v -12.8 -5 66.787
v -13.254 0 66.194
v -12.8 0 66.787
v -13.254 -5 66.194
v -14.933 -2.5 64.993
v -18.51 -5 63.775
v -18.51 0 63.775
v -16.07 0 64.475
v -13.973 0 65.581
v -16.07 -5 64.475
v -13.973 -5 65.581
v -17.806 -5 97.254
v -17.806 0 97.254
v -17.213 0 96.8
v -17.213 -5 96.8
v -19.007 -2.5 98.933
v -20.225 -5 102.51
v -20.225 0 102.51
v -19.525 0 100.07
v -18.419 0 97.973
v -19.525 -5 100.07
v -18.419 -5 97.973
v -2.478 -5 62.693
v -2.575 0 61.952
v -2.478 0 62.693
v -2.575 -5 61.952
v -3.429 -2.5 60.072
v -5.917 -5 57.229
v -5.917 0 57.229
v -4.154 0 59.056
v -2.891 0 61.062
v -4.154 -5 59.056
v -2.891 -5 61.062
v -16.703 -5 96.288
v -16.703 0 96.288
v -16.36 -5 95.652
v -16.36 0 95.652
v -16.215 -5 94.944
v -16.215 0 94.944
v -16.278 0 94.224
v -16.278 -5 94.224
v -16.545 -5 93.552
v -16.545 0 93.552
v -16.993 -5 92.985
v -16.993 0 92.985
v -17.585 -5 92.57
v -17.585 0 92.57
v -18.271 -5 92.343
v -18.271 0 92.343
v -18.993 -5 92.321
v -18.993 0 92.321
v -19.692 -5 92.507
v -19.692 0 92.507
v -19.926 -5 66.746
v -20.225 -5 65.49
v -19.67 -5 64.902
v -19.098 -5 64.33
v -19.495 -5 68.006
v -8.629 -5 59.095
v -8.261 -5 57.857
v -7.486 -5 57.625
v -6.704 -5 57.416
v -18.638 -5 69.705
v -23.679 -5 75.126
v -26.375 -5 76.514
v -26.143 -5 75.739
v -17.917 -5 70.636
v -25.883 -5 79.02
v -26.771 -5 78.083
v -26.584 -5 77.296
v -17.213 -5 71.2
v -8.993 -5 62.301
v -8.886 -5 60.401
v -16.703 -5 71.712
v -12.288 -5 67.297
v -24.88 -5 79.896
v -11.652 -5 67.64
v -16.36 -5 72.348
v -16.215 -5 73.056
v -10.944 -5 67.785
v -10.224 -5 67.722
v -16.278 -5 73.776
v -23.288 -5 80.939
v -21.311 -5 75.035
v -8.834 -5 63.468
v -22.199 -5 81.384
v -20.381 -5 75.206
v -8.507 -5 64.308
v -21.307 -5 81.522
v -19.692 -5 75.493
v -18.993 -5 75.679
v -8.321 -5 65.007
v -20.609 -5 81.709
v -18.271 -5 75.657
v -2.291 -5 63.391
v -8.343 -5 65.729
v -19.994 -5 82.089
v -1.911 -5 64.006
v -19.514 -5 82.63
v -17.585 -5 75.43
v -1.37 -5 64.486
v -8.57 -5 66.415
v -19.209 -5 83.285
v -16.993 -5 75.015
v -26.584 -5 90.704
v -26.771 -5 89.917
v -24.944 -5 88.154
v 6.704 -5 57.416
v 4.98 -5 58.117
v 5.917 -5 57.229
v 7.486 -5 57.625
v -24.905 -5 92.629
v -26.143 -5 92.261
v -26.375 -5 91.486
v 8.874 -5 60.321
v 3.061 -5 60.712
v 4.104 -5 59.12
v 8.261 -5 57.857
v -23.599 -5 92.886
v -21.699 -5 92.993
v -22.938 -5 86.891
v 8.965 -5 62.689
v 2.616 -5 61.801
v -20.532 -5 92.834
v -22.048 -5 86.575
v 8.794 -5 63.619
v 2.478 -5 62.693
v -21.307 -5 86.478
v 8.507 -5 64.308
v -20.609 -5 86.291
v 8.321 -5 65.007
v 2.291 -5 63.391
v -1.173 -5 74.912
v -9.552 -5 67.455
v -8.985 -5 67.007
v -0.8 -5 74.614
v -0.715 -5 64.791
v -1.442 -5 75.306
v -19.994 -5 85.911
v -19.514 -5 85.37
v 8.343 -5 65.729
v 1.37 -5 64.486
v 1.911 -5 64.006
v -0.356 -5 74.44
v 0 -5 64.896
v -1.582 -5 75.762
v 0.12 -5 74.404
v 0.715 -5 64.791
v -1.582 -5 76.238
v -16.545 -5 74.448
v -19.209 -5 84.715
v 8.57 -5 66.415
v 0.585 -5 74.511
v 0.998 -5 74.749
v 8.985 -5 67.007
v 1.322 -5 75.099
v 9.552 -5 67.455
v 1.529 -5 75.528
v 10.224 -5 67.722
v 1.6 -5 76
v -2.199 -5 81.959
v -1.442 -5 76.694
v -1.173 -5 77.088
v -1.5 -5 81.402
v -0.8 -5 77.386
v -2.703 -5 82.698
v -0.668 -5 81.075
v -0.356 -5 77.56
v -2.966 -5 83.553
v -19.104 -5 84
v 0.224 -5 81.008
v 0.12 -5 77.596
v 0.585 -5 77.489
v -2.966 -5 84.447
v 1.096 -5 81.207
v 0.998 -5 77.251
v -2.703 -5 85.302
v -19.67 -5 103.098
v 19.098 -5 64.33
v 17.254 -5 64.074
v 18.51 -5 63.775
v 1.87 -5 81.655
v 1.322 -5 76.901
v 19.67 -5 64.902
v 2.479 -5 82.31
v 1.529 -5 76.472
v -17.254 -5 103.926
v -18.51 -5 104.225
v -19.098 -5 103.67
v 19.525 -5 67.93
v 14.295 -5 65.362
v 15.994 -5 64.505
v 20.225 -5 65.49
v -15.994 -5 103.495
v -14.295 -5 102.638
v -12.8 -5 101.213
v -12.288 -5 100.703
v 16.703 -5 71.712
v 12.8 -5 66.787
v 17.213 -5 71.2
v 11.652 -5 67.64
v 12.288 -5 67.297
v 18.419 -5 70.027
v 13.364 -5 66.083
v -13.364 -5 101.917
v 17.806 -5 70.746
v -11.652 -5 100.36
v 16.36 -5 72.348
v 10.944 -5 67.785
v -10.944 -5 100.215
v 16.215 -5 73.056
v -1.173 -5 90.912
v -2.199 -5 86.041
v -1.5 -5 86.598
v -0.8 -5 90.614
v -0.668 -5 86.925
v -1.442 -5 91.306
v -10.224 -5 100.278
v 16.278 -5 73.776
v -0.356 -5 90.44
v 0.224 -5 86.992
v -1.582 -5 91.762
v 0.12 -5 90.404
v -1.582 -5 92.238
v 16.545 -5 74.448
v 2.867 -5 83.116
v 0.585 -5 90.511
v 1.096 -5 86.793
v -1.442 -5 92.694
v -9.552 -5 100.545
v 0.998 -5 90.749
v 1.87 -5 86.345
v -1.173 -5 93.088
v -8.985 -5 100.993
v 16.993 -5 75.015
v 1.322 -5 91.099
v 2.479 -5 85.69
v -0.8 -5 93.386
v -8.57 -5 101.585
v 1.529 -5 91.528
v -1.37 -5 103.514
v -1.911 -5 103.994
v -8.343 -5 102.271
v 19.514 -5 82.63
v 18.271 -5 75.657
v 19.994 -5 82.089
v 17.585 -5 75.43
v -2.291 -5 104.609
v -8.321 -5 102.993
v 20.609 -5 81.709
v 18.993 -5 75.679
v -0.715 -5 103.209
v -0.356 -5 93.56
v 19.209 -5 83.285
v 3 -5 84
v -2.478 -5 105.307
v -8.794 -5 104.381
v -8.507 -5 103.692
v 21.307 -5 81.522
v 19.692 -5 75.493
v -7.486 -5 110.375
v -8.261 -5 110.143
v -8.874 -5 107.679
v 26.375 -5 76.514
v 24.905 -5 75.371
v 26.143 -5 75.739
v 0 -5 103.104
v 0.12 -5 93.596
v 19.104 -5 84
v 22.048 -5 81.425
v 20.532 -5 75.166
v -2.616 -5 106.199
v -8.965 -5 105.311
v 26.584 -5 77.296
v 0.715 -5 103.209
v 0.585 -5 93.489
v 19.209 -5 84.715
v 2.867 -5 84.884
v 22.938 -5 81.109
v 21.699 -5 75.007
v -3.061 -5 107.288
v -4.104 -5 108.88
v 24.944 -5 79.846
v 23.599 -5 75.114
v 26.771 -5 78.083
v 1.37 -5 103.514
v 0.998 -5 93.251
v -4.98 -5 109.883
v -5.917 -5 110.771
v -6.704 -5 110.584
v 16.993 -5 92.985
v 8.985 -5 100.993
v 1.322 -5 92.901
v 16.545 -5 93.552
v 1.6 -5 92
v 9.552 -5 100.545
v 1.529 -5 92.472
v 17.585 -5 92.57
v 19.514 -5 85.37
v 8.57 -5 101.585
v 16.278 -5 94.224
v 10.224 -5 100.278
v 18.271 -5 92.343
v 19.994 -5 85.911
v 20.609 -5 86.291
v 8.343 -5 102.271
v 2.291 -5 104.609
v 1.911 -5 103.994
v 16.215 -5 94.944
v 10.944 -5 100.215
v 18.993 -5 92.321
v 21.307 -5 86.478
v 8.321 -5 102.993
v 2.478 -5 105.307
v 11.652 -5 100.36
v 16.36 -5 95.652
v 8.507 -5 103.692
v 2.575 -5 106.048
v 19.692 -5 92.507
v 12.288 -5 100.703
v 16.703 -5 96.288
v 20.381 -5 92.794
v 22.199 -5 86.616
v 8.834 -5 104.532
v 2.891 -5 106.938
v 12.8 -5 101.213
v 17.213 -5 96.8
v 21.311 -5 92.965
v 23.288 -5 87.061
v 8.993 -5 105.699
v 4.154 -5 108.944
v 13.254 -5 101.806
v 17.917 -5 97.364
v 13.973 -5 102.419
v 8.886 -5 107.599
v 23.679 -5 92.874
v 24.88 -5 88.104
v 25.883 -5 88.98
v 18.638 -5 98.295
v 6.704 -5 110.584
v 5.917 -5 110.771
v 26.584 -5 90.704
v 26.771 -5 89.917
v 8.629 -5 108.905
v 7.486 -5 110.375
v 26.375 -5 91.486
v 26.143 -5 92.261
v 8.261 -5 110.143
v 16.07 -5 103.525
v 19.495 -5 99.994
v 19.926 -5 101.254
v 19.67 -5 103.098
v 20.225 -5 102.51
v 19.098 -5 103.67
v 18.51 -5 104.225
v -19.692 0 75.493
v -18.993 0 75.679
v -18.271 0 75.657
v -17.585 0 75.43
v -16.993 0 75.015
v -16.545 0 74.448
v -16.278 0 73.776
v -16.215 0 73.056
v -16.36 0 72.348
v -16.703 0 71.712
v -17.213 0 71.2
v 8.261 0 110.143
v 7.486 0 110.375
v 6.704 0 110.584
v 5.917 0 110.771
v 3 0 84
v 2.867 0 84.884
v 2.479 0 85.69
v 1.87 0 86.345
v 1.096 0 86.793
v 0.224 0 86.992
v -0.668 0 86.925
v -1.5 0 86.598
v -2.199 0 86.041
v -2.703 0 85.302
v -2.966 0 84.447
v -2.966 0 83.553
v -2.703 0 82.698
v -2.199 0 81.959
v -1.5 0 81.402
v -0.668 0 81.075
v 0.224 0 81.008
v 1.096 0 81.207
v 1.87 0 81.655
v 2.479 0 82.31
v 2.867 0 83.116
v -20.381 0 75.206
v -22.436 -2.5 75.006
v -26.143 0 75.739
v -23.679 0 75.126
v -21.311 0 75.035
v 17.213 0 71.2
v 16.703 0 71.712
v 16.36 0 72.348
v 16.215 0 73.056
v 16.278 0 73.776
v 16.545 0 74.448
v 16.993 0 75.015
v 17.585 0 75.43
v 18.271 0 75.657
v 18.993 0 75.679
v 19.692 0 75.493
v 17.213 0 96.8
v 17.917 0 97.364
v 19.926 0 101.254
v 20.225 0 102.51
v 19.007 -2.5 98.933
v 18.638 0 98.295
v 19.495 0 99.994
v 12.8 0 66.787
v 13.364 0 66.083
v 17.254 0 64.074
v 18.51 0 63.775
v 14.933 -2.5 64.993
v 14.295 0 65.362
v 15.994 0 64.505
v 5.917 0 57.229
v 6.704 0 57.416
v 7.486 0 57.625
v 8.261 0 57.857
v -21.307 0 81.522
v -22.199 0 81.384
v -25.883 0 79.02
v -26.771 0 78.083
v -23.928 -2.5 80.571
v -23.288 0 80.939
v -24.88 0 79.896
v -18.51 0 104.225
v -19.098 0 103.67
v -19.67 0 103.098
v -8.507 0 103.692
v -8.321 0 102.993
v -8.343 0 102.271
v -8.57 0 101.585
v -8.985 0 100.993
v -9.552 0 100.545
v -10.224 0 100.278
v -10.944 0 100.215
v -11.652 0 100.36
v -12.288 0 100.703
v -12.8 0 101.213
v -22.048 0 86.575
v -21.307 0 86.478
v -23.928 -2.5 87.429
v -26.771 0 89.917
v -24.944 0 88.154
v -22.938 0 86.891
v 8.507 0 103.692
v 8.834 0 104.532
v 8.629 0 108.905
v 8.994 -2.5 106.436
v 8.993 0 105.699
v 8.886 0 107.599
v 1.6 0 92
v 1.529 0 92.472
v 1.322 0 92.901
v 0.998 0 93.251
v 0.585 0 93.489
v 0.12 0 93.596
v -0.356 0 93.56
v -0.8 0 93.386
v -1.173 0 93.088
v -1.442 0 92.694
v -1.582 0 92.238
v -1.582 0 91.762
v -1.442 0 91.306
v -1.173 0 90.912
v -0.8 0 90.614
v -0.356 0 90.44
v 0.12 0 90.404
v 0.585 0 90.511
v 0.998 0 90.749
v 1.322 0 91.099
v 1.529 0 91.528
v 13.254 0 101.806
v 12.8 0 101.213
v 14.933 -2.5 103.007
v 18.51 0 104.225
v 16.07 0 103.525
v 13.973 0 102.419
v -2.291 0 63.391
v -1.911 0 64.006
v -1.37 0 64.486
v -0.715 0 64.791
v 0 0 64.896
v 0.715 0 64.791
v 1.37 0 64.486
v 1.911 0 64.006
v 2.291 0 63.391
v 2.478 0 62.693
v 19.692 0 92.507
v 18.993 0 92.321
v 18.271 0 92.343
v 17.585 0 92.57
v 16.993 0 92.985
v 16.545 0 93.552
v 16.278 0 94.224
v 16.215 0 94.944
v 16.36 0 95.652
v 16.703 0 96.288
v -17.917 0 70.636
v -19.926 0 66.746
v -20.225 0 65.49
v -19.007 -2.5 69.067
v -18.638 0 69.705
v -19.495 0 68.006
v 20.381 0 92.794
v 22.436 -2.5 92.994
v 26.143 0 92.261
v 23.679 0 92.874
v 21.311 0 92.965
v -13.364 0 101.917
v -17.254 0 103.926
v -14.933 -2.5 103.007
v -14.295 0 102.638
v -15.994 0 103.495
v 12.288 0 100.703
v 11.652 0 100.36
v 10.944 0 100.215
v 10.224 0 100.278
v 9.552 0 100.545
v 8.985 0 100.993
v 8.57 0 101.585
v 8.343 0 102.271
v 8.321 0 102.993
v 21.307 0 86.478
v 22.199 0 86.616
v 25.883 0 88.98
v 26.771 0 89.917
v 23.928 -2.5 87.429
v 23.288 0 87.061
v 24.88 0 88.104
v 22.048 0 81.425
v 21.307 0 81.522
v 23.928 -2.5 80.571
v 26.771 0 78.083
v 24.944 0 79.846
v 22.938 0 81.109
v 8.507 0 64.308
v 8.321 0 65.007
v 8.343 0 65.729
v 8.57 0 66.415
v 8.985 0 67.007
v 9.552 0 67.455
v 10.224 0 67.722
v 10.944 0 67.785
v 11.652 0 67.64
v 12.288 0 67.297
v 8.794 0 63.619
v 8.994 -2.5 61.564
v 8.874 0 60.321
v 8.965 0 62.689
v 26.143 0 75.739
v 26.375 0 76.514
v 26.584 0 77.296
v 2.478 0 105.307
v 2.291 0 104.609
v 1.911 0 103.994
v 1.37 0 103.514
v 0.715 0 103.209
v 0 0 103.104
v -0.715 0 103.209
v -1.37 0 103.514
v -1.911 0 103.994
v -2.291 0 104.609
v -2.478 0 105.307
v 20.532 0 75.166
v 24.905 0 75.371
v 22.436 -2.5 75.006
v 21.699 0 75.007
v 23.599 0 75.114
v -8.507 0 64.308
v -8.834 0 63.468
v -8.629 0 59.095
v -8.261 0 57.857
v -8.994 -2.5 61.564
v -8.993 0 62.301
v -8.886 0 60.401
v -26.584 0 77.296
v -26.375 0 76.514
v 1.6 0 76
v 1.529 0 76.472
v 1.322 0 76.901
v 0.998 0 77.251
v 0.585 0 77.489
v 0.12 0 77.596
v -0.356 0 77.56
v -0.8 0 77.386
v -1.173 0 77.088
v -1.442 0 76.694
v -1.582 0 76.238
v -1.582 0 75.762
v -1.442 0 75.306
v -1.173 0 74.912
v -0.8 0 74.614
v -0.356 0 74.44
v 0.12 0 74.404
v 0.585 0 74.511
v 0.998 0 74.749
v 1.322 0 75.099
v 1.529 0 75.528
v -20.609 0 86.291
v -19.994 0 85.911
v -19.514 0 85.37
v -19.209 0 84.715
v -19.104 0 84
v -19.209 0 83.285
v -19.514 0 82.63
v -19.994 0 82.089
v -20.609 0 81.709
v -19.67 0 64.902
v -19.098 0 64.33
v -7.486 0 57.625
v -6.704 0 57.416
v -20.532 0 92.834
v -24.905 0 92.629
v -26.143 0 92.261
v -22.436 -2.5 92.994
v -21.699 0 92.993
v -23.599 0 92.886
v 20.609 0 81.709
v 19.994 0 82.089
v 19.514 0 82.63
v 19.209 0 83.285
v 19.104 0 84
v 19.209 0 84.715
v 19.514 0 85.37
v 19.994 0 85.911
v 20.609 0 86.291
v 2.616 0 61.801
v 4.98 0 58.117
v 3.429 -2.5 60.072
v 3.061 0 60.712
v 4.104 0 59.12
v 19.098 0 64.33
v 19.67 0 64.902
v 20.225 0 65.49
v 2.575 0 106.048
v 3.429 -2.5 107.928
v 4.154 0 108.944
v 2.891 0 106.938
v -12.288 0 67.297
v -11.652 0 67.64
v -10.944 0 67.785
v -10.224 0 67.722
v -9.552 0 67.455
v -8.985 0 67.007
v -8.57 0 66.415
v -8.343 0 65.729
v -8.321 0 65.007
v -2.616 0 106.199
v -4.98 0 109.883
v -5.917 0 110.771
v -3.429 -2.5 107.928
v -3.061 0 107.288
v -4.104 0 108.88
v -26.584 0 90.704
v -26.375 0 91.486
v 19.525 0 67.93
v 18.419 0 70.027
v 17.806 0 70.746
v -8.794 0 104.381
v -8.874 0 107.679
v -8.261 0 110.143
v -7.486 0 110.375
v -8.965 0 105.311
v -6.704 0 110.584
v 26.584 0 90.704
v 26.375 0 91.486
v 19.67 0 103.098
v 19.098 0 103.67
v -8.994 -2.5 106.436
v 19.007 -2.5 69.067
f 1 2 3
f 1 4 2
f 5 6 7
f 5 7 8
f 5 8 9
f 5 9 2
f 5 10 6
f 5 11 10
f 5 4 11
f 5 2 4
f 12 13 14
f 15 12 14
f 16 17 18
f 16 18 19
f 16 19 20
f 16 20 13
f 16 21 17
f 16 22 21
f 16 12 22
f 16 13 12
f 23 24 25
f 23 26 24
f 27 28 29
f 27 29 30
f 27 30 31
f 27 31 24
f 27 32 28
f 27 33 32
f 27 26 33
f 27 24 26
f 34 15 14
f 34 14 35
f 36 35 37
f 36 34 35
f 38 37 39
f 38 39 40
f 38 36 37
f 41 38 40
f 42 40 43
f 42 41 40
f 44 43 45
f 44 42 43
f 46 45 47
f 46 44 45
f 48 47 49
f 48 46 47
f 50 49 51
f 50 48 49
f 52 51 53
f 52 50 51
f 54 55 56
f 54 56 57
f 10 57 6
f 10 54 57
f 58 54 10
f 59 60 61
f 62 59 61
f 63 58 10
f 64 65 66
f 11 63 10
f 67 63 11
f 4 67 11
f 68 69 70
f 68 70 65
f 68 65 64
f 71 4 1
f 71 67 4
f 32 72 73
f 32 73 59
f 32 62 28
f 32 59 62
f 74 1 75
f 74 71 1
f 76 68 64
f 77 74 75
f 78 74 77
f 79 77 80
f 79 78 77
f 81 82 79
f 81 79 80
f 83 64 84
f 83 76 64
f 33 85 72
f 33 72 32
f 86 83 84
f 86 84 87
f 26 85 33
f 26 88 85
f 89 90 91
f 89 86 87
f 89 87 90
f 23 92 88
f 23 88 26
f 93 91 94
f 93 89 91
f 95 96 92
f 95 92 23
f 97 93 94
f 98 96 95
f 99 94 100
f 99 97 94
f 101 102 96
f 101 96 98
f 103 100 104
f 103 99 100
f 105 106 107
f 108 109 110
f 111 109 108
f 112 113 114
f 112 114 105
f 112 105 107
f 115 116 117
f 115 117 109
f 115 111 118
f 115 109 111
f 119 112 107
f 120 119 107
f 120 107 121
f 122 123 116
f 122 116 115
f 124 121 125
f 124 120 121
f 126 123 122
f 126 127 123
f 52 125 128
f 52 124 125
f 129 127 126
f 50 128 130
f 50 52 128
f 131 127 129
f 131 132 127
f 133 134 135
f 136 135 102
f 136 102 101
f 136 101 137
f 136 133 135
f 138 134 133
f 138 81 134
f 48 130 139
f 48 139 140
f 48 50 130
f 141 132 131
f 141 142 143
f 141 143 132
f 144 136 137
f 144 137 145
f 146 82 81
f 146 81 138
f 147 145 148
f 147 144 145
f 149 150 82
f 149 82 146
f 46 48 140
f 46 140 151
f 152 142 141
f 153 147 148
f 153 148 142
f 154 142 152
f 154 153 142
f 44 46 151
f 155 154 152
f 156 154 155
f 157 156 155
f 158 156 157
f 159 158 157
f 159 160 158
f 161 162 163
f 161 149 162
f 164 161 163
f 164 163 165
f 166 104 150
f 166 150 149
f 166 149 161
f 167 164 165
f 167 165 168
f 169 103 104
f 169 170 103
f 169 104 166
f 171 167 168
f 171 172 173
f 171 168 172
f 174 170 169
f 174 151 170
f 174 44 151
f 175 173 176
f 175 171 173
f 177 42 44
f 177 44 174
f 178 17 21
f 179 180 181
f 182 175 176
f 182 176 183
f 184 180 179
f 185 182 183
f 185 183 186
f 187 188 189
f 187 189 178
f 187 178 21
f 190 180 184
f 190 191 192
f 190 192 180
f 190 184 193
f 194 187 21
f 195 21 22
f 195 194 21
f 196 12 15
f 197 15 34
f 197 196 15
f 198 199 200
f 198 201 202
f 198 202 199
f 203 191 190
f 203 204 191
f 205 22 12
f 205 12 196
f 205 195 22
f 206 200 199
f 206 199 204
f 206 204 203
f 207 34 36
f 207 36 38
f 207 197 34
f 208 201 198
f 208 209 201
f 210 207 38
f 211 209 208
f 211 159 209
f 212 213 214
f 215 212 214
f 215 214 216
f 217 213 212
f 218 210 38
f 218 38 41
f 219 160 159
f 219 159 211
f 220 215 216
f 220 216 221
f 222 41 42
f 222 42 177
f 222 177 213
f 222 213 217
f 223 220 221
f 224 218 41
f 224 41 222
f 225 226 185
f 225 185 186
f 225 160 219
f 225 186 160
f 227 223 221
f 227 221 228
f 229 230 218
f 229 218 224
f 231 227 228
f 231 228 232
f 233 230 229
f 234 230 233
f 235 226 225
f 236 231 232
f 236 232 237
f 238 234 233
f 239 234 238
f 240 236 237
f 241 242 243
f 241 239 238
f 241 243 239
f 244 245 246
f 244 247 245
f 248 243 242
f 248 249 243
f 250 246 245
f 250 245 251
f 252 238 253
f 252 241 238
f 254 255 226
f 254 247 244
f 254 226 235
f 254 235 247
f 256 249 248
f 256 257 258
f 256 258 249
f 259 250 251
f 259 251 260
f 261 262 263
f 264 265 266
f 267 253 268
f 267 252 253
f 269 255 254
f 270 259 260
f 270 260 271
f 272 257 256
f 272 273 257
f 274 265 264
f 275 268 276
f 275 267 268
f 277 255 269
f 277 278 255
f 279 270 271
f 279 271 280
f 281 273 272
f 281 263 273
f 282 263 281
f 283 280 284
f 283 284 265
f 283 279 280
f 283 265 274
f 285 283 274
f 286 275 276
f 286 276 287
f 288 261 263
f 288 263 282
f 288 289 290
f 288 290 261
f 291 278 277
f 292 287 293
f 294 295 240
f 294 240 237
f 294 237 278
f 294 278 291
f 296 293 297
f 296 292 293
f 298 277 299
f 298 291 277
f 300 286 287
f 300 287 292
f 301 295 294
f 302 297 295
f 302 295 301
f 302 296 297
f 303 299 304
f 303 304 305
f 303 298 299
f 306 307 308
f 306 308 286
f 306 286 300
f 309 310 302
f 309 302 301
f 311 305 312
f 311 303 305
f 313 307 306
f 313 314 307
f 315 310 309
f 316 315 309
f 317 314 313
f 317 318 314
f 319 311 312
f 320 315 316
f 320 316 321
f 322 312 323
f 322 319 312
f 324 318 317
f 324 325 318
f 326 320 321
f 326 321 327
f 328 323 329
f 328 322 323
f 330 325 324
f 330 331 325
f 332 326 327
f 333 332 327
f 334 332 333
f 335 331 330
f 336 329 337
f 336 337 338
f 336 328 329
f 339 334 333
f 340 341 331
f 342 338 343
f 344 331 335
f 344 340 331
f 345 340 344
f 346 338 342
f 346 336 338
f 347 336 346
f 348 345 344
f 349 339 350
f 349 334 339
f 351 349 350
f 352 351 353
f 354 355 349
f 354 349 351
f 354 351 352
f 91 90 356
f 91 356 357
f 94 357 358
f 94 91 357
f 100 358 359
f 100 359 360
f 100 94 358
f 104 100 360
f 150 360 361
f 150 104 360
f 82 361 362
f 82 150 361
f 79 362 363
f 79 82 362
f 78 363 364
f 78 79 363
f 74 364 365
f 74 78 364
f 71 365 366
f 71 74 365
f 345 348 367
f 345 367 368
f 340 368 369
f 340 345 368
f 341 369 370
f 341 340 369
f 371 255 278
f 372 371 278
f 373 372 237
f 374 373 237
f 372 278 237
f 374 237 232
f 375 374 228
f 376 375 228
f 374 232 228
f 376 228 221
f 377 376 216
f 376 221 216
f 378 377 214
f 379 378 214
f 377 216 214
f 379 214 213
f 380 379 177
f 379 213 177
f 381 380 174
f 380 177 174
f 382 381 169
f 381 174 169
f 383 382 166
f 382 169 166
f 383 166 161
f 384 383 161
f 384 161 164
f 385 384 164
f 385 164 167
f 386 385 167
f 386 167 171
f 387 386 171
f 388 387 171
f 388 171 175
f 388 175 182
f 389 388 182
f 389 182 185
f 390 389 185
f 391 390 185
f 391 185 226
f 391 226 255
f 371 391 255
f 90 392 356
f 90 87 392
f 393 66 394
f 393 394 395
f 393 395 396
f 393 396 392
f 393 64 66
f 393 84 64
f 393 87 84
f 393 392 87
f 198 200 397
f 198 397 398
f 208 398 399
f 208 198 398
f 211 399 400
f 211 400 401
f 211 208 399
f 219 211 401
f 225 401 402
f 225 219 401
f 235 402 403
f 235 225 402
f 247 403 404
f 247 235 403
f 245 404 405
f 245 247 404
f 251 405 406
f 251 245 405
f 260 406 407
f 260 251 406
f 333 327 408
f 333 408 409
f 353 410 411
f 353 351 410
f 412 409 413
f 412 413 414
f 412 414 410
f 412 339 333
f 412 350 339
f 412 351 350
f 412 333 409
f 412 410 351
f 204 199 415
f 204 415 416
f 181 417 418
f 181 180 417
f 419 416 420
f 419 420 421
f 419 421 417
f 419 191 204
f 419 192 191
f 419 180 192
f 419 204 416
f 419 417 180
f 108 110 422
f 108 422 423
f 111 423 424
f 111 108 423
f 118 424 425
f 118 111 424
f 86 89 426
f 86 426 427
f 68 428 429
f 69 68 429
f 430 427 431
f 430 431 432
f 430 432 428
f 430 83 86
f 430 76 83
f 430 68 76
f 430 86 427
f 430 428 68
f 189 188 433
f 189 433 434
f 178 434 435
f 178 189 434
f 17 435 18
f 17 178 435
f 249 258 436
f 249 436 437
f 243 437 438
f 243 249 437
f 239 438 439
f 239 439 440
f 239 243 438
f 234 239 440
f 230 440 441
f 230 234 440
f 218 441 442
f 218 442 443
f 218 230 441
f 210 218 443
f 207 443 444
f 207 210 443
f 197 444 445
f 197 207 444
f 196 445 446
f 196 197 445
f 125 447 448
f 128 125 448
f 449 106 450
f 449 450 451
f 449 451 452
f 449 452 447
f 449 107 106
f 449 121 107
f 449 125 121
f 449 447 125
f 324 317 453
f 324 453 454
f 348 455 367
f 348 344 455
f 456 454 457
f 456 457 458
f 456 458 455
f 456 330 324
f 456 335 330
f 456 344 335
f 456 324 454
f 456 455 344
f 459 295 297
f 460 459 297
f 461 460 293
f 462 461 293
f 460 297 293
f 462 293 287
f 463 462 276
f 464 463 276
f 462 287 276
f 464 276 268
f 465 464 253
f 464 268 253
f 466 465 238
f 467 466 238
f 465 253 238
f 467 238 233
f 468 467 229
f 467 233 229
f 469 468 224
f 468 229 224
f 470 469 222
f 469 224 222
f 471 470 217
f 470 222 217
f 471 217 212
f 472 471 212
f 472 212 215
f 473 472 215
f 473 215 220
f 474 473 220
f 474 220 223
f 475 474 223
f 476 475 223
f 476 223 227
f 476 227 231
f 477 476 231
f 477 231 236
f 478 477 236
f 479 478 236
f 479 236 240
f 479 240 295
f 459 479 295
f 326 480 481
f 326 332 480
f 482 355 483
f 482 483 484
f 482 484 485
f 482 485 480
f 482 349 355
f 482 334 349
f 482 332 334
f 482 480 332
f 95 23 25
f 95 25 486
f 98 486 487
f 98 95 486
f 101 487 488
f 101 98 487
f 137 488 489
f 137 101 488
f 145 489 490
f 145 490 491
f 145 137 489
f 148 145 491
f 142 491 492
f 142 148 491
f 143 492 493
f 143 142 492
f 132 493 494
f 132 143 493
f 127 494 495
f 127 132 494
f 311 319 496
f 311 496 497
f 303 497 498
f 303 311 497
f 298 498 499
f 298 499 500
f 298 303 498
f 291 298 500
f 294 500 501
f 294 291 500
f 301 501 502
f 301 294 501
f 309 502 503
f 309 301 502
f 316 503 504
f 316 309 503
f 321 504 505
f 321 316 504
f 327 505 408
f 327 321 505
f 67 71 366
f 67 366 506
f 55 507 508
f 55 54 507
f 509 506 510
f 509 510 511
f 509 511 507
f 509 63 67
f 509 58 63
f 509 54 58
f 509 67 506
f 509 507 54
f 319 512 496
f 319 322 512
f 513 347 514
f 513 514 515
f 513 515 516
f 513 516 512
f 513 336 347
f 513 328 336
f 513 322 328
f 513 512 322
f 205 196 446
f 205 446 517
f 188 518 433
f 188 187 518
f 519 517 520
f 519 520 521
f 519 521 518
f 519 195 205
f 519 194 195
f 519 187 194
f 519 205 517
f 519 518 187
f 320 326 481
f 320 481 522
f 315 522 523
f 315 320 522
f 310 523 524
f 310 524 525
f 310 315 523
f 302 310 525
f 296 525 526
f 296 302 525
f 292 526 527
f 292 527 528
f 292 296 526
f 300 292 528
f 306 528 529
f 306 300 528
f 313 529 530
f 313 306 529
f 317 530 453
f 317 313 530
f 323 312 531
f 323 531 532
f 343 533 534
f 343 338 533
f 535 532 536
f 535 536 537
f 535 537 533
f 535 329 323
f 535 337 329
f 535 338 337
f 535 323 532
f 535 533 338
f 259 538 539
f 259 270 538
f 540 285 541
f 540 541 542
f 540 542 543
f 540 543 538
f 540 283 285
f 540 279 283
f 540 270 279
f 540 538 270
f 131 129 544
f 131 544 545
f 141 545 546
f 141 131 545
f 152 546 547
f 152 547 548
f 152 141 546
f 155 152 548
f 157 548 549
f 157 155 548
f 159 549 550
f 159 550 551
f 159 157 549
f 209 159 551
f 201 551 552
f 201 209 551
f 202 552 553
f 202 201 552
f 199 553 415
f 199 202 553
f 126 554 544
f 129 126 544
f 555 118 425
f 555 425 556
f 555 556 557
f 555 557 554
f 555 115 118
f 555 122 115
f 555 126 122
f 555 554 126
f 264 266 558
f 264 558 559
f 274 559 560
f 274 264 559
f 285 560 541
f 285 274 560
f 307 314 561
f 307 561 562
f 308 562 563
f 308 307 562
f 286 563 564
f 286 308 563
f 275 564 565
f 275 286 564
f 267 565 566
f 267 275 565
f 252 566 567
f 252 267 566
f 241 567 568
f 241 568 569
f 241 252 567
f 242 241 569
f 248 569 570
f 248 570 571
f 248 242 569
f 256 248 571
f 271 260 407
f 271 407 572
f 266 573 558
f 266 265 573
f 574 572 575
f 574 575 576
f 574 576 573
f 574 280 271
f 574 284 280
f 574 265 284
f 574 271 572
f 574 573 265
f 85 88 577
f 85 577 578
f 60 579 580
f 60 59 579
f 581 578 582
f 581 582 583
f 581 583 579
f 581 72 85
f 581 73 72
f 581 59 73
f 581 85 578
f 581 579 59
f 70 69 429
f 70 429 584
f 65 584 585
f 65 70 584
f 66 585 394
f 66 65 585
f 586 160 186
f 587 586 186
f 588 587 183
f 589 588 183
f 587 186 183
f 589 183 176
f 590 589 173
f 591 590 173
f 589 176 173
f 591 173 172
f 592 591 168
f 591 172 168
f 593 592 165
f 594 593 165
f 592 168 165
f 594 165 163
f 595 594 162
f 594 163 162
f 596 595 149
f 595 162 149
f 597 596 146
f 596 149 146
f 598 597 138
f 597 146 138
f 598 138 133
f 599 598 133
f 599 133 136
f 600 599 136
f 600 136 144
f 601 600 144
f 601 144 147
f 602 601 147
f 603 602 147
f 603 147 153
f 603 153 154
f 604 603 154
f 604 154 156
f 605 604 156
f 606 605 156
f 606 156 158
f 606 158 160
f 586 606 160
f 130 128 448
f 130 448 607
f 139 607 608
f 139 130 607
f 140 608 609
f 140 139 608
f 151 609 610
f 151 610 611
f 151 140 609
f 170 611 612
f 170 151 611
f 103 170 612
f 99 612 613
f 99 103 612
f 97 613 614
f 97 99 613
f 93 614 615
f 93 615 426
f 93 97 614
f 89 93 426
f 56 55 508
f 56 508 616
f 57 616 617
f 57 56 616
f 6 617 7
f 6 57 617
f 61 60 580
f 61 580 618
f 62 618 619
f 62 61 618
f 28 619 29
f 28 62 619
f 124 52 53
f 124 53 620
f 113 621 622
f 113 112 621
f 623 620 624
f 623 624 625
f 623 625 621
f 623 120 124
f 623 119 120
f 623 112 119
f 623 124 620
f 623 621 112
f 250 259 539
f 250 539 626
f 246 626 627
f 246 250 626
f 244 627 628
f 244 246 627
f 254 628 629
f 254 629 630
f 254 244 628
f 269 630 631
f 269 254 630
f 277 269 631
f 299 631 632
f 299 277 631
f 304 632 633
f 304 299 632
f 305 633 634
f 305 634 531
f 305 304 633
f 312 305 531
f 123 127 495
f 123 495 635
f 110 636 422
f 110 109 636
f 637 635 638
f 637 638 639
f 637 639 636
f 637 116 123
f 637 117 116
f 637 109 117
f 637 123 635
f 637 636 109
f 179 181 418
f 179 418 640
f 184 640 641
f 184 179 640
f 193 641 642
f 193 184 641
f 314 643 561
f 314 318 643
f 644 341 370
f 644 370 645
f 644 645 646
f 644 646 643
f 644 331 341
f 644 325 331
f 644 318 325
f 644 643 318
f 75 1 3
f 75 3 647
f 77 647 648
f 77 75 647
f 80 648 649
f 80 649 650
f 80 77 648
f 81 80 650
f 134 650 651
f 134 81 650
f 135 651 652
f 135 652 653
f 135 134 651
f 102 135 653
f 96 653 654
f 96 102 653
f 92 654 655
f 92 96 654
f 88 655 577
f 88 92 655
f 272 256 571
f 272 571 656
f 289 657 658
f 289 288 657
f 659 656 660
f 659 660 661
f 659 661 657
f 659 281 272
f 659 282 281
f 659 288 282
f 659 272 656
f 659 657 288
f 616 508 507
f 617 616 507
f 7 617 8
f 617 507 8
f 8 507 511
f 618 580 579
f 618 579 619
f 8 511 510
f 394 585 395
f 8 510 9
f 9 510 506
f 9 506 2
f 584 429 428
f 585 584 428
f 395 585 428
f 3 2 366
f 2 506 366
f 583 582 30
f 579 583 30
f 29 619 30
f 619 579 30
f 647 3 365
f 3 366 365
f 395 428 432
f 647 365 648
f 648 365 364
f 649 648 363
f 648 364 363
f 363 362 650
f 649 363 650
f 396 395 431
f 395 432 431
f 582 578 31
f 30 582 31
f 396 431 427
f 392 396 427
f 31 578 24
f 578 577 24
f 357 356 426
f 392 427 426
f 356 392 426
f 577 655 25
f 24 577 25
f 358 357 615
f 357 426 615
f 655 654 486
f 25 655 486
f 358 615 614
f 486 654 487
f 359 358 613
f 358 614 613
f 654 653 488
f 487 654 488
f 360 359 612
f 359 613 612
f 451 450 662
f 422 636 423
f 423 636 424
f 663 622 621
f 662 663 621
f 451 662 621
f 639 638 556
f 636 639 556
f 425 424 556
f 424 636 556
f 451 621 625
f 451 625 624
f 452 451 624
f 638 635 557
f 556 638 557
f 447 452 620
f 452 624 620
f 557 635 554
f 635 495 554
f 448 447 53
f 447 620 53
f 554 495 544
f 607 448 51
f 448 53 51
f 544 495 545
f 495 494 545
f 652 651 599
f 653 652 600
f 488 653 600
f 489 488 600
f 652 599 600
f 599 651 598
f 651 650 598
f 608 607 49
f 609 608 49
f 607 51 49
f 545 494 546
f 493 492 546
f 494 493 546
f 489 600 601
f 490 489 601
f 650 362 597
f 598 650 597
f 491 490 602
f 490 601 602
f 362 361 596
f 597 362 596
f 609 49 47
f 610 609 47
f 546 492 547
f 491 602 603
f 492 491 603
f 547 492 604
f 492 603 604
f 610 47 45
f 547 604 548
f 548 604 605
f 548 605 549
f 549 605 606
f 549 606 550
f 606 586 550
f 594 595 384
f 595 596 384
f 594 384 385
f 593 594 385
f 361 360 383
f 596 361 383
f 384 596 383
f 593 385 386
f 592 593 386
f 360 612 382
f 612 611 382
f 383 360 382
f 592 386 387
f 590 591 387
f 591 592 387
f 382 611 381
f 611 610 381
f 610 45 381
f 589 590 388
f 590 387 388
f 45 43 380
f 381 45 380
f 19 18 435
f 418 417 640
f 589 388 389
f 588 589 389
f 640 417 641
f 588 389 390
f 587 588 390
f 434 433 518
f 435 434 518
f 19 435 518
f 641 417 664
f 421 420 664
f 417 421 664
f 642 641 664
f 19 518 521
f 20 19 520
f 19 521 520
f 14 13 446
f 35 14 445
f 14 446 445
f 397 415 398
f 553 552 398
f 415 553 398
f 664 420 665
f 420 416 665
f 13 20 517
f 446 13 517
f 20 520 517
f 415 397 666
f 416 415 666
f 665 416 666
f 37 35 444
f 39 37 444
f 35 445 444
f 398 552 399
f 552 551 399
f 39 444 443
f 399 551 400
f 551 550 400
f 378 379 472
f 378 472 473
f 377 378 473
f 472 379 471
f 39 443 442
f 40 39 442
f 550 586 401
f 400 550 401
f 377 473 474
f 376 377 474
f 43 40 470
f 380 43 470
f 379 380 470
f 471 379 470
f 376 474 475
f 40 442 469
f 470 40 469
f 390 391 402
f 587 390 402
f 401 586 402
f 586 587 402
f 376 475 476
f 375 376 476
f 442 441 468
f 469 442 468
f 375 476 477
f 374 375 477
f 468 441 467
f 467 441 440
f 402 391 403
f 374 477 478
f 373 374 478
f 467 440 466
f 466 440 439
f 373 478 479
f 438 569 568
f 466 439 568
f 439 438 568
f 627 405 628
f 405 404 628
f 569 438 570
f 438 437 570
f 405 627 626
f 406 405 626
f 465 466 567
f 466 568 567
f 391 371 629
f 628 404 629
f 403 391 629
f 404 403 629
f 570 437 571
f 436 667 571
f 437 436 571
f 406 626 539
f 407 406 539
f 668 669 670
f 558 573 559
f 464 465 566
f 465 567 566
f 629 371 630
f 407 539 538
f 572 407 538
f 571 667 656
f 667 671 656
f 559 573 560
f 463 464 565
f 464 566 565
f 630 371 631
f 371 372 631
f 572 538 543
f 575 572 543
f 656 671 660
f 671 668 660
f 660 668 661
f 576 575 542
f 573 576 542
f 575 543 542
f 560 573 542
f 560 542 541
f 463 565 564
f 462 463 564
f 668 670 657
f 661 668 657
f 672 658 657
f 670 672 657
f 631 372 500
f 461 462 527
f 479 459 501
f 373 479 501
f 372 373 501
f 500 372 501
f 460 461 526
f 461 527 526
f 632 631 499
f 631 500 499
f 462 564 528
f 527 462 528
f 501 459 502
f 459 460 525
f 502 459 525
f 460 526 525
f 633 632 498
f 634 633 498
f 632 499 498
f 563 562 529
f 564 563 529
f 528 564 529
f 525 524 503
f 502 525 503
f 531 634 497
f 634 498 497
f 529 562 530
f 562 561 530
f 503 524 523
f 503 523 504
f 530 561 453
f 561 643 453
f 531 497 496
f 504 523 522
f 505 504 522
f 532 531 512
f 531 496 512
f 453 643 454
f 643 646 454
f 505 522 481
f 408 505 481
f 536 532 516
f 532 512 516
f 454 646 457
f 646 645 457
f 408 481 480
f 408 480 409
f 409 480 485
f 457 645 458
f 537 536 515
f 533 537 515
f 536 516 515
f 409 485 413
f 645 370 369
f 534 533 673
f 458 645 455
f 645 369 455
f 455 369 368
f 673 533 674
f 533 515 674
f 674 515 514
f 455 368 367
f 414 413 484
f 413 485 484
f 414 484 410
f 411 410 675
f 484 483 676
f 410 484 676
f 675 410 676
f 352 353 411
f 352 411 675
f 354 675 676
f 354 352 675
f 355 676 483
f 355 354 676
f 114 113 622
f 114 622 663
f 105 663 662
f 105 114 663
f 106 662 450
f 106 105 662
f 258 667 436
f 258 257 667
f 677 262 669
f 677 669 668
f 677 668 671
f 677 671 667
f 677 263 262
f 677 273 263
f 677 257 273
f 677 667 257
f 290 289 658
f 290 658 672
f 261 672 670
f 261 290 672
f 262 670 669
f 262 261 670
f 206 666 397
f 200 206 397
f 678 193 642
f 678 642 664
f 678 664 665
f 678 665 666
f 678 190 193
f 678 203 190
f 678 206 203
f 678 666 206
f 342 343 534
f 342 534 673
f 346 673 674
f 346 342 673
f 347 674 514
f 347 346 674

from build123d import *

# Parameters (mm, degrees)
RESSALTO_EXTRUS_O1_DEPTH = 5
ESBO_O3_R                = 3
ESBO_O3_R_2              = 1.6
CORTE_EXTRUS_O1_DEPTH    = 10


with BuildPart() as part:
    # Esboço1 → Ressalto-extrusão1 (new body)
    with BuildSketch(Plane.XZ.offset(5)):
        with BuildLine():
            ThreePointArc((-19.691703555, 75.492649623), (-16.544693651, 74.447916667), (-17.213433323, 71.200159666))
            add(Edge.make_bspline(
                [(-17.213433323, 71.200159666), (-19.371007478, 69.977475346), (-20.225381706, 65.490339119)],
                knots=[3.520301614, 3.520301614, 3.520301614, 4.832179179, 4.832179179, 4.832179179], degree=2, weights=[1, 0.79247571, 1]))
            ThreePointArc((-20.225381706, 65.490339119), (-19.386510918, 64.613489082), (-18.509660881, 63.774618294))
            add(Edge.make_bspline(
                [(-18.509660881, 63.774618294), (-14.022524654, 64.628992522), (-12.799840334, 66.786566677)],
                knots=[4.592598781, 4.592598781, 4.592598781, 5.904476347, 5.904476347, 5.904476347], degree=2, weights=[1, 0.79247571, 1]))
            ThreePointArc((-12.799840334, 66.786566677), (-9.552083333, 67.455306349), (-8.507350377, 64.308296445))
            add(Edge.make_bspline(
                [(-8.507350377, 64.308296445), (-9.764522246, 62.170633685), (-8.260863918, 57.857472608)],
                knots=[0.37870896, 0.37870896, 0.37870896, 1.690586526, 1.690586526, 1.690586526], degree=2, weights=[1, 0.79247571, 1]))
            ThreePointArc((-8.260863918, 57.857472608), (-7.095955487, 57.517533596), (-5.917145685, 57.2294752))
            add(Edge.make_bspline(
                [(-5.917145685, 57.2294752), (-2.458358837, 60.2129531), (-2.478270232, 62.692809289)],
                knots=[4.592598781, 4.592598781, 4.592598781, 5.904476347, 5.904476347, 5.904476347], degree=2, weights=[1, 0.79247571, 1]))
            ThreePointArc((-2.478270232, 62.692809289), (0, 64.895833333), (2.478270232, 62.692809289))
            add(Edge.make_bspline(
                [(2.478270232, 62.692809289), (2.458358837, 60.2129531), (5.917145685, 57.2294752)],
                knots=[3.520301614, 3.520301614, 3.520301614, 4.832179179, 4.832179179, 4.832179179], degree=2, weights=[1, 0.79247571, 1]))
            ThreePointArc((5.917145685, 57.2294752), (7.095955487, 57.517533596), (8.260863918, 57.857472608))
            add(Edge.make_bspline(
                [(8.260863918, 57.857472608), (9.764522246, 62.170633685), (8.507350377, 64.308296445)],
                knots=[4.592598781, 4.592598781, 4.592598781, 5.904476347, 5.904476347, 5.904476347], degree=2, weights=[1, 0.79247571, 1]))
            ThreePointArc((8.507350377, 64.308296445), (9.552083333, 67.455306349), (12.799840334, 66.786566677))
            add(Edge.make_bspline(
                [(12.799840334, 66.786566677), (14.022524654, 64.628992522), (18.509660881, 63.774618294)],
                knots=[3.520301614, 3.520301614, 3.520301614, 4.832179179, 4.832179179, 4.832179179], degree=2, weights=[1, 0.79247571, 1]))
            ThreePointArc((18.509660881, 63.774618294), (19.386510918, 64.613489082), (20.225381706, 65.490339119))
            add(Edge.make_bspline(
                [(20.225381706, 65.490339119), (19.371007478, 69.977475346), (17.213433323, 71.200159666)],
                knots=[4.592598781, 4.592598781, 4.592598781, 5.904476347, 5.904476347, 5.904476347], degree=2, weights=[1, 0.79247571, 1]))
            ThreePointArc((17.213433323, 71.200159666), (16.544693651, 74.447916667), (19.691703555, 75.492649623))
            add(Edge.make_bspline(
                [(19.691703555, 75.492649623), (21.829366315, 74.235477754), (26.142527392, 75.739136082)],
                knots=[3.520301614, 3.520301614, 3.520301614, 4.832179179, 4.832179179, 4.832179179], degree=2, weights=[1, 0.79247571, 1]))
            ThreePointArc((26.142527392, 75.739136082), (26.482466404, 76.904044513), (26.7705248, 78.082854315))
            add(Edge.make_bspline(
                [(26.7705248, 78.082854315), (23.7870469, 81.541641163), (21.307190711, 81.521729768)],
                knots=[4.592598781, 4.592598781, 4.592598781, 5.904476347, 5.904476347, 5.904476347], degree=2, weights=[1, 0.79247571, 1]))
            ThreePointArc((21.307190711, 81.521729768), (19.104166667, 84), (21.307190711, 86.478270232))
            add(Edge.make_bspline(
                [(21.307190711, 86.478270232), (23.7870469, 86.458358837), (26.7705248, 89.917145685)],
                knots=[0.37870896, 0.37870896, 0.37870896, 1.690586526, 1.690586526, 1.690586526], degree=2, weights=[1, 0.79247571, 1]))
            ThreePointArc((26.7705248, 89.917145685), (26.482466404, 91.095955487), (26.142527392, 92.260863918))
            add(Edge.make_bspline(
                [(26.142527392, 92.260863918), (21.829366315, 93.764522246), (19.691703555, 92.507350377)],
                knots=[1.451006128, 1.451006128, 1.451006128, 2.762883693, 2.762883693, 2.762883693], degree=2, weights=[1, 0.79247571, 1]))
            ThreePointArc((19.691703555, 92.507350377), (16.544693651, 93.552083333), (17.213433323, 96.799840334))
            add(Edge.make_bspline(
                [(17.213433323, 96.799840334), (19.371007478, 98.022524654), (20.225381706, 102.509660881)],
                knots=[0.37870896, 0.37870896, 0.37870896, 1.690586526, 1.690586526, 1.690586526], degree=2, weights=[1, 0.79247571, 1]))
            ThreePointArc((20.225381706, 102.509660881), (19.386510918, 103.386510918), (18.509660881, 104.225381706))
            add(Edge.make_bspline(
                [(18.509660881, 104.225381706), (14.022524654, 103.371007478), (12.799840334, 101.213433323)],
                knots=[4.592598781, 4.592598781, 4.592598781, 5.904476347, 5.904476347, 5.904476347], degree=2, weights=[1, 0.79247571, 1]))
            ThreePointArc((12.799840334, 101.213433323), (9.552083333, 100.544693651), (8.507350377, 103.691703555))
            add(Edge.make_bspline(
                [(8.507350377, 103.691703555), (9.764522246, 105.829366315), (8.260863918, 110.142527392)],
                knots=[0.37870896, 0.37870896, 0.37870896, 1.690586526, 1.690586526, 1.690586526], degree=2, weights=[1, 0.79247571, 1]))
            ThreePointArc((8.260863918, 110.142527392), (7.095955487, 110.482466404), (5.917145685, 110.7705248))
            add(Edge.make_bspline(
                [(5.917145685, 110.7705248), (2.458358837, 107.7870469), (2.478270232, 105.307190711)],
                knots=[1.451006128, 1.451006128, 1.451006128, 2.762883693, 2.762883693, 2.762883693], degree=2, weights=[1, 0.79247571, 1]))
            ThreePointArc((2.478270232, 105.307190711), (0, 103.104166667), (-2.478270232, 105.307190711))
            add(Edge.make_bspline(
                [(-2.478270232, 105.307190711), (-2.458358837, 107.7870469), (-5.917145685, 110.7705248)],
                knots=[0.37870896, 0.37870896, 0.37870896, 1.690586526, 1.690586526, 1.690586526], degree=2, weights=[1, 0.79247571, 1]))
            ThreePointArc((-5.917145685, 110.7705248), (-7.095955487, 110.482466404), (-8.260863918, 110.142527392))
            add(Edge.make_bspline(
                [(-8.260863918, 110.142527392), (-9.764522246, 105.829366315), (-8.507350377, 103.691703555)],
                knots=[1.451006128, 1.451006128, 1.451006128, 2.762883693, 2.762883693, 2.762883693], degree=2, weights=[1, 0.79247571, 1]))
            ThreePointArc((-8.507350377, 103.691703555), (-9.552083333, 100.544693651), (-12.799840334, 101.213433323))
            add(Edge.make_bspline(
                [(-12.799840334, 101.213433323), (-14.022524654, 103.371007478), (-18.509660881, 104.225381706)],
                knots=[0.37870896, 0.37870896, 0.37870896, 1.690586526, 1.690586526, 1.690586526], degree=2, weights=[1, 0.79247571, 1]))
            ThreePointArc((-18.509660881, 104.225381706), (-19.386510918, 103.386510918), (-20.225381706, 102.509660881))
            add(Edge.make_bspline(
                [(-20.225381706, 102.509660881), (-19.371007478, 98.022524654), (-17.213433323, 96.799840334)],
                knots=[1.451006128, 1.451006128, 1.451006128, 2.762883693, 2.762883693, 2.762883693], degree=2, weights=[1, 0.79247571, 1]))
            ThreePointArc((-17.213433323, 96.799840334), (-16.544693651, 93.552083333), (-19.691703555, 92.507350377))
            add(Edge.make_bspline(
                [(-19.691703555, 92.507350377), (-21.829366315, 93.764522246), (-26.142527392, 92.260863918)],
                knots=[0.37870896, 0.37870896, 0.37870896, 1.690586526, 1.690586526, 1.690586526], degree=2, weights=[1, 0.79247571, 1]))
            ThreePointArc((-26.142527392, 92.260863918), (-26.482466404, 91.095955487), (-26.7705248, 89.917145685))
            add(Edge.make_bspline(
                [(-26.7705248, 89.917145685), (-23.7870469, 86.458358837), (-21.307190711, 86.478270232)],
                knots=[1.451006128, 1.451006128, 1.451006128, 2.762883693, 2.762883693, 2.762883693], degree=2, weights=[1, 0.79247571, 1]))
            ThreePointArc((-21.307190711, 86.478270232), (-19.104166667, 84), (-21.307190711, 81.521729768))
            add(Edge.make_bspline(
                [(-21.307190711, 81.521729768), (-23.7870469, 81.541641163), (-26.7705248, 78.082854315)],
                knots=[3.520301614, 3.520301614, 3.520301614, 4.832179179, 4.832179179, 4.832179179], degree=2, weights=[1, 0.79247571, 1]))
            ThreePointArc((-26.7705248, 78.082854315), (-26.482466404, 76.904044513), (-26.142527392, 75.739136082))
            add(Edge.make_bspline(
                [(-26.142527392, 75.739136082), (-21.829366315, 74.235477754), (-19.691703555, 75.492649623)],
                knots=[4.592598781, 4.592598781, 4.592598781, 5.904476347, 5.904476347, 5.904476347], degree=2, weights=[1, 0.79247571, 1]))
        make_face()
    extrude(amount=-RESSALTO_EXTRUS_O1_DEPTH)

    # Esboço3 → Corte-extrusão1 (cut)
    with BuildSketch(Plane.XZ.offset(5)):
        with Locations((0, 84)):
            Circle(ESBO_O3_R)
        with Locations((0, 92)):
            Circle(ESBO_O3_R_2)
        with Locations((0, 76)):
            Circle(ESBO_O3_R_2)
    extrude(amount=-CORTE_EXTRUS_O1_DEPTH, mode=Mode.SUBTRACT)


solid = part.part
